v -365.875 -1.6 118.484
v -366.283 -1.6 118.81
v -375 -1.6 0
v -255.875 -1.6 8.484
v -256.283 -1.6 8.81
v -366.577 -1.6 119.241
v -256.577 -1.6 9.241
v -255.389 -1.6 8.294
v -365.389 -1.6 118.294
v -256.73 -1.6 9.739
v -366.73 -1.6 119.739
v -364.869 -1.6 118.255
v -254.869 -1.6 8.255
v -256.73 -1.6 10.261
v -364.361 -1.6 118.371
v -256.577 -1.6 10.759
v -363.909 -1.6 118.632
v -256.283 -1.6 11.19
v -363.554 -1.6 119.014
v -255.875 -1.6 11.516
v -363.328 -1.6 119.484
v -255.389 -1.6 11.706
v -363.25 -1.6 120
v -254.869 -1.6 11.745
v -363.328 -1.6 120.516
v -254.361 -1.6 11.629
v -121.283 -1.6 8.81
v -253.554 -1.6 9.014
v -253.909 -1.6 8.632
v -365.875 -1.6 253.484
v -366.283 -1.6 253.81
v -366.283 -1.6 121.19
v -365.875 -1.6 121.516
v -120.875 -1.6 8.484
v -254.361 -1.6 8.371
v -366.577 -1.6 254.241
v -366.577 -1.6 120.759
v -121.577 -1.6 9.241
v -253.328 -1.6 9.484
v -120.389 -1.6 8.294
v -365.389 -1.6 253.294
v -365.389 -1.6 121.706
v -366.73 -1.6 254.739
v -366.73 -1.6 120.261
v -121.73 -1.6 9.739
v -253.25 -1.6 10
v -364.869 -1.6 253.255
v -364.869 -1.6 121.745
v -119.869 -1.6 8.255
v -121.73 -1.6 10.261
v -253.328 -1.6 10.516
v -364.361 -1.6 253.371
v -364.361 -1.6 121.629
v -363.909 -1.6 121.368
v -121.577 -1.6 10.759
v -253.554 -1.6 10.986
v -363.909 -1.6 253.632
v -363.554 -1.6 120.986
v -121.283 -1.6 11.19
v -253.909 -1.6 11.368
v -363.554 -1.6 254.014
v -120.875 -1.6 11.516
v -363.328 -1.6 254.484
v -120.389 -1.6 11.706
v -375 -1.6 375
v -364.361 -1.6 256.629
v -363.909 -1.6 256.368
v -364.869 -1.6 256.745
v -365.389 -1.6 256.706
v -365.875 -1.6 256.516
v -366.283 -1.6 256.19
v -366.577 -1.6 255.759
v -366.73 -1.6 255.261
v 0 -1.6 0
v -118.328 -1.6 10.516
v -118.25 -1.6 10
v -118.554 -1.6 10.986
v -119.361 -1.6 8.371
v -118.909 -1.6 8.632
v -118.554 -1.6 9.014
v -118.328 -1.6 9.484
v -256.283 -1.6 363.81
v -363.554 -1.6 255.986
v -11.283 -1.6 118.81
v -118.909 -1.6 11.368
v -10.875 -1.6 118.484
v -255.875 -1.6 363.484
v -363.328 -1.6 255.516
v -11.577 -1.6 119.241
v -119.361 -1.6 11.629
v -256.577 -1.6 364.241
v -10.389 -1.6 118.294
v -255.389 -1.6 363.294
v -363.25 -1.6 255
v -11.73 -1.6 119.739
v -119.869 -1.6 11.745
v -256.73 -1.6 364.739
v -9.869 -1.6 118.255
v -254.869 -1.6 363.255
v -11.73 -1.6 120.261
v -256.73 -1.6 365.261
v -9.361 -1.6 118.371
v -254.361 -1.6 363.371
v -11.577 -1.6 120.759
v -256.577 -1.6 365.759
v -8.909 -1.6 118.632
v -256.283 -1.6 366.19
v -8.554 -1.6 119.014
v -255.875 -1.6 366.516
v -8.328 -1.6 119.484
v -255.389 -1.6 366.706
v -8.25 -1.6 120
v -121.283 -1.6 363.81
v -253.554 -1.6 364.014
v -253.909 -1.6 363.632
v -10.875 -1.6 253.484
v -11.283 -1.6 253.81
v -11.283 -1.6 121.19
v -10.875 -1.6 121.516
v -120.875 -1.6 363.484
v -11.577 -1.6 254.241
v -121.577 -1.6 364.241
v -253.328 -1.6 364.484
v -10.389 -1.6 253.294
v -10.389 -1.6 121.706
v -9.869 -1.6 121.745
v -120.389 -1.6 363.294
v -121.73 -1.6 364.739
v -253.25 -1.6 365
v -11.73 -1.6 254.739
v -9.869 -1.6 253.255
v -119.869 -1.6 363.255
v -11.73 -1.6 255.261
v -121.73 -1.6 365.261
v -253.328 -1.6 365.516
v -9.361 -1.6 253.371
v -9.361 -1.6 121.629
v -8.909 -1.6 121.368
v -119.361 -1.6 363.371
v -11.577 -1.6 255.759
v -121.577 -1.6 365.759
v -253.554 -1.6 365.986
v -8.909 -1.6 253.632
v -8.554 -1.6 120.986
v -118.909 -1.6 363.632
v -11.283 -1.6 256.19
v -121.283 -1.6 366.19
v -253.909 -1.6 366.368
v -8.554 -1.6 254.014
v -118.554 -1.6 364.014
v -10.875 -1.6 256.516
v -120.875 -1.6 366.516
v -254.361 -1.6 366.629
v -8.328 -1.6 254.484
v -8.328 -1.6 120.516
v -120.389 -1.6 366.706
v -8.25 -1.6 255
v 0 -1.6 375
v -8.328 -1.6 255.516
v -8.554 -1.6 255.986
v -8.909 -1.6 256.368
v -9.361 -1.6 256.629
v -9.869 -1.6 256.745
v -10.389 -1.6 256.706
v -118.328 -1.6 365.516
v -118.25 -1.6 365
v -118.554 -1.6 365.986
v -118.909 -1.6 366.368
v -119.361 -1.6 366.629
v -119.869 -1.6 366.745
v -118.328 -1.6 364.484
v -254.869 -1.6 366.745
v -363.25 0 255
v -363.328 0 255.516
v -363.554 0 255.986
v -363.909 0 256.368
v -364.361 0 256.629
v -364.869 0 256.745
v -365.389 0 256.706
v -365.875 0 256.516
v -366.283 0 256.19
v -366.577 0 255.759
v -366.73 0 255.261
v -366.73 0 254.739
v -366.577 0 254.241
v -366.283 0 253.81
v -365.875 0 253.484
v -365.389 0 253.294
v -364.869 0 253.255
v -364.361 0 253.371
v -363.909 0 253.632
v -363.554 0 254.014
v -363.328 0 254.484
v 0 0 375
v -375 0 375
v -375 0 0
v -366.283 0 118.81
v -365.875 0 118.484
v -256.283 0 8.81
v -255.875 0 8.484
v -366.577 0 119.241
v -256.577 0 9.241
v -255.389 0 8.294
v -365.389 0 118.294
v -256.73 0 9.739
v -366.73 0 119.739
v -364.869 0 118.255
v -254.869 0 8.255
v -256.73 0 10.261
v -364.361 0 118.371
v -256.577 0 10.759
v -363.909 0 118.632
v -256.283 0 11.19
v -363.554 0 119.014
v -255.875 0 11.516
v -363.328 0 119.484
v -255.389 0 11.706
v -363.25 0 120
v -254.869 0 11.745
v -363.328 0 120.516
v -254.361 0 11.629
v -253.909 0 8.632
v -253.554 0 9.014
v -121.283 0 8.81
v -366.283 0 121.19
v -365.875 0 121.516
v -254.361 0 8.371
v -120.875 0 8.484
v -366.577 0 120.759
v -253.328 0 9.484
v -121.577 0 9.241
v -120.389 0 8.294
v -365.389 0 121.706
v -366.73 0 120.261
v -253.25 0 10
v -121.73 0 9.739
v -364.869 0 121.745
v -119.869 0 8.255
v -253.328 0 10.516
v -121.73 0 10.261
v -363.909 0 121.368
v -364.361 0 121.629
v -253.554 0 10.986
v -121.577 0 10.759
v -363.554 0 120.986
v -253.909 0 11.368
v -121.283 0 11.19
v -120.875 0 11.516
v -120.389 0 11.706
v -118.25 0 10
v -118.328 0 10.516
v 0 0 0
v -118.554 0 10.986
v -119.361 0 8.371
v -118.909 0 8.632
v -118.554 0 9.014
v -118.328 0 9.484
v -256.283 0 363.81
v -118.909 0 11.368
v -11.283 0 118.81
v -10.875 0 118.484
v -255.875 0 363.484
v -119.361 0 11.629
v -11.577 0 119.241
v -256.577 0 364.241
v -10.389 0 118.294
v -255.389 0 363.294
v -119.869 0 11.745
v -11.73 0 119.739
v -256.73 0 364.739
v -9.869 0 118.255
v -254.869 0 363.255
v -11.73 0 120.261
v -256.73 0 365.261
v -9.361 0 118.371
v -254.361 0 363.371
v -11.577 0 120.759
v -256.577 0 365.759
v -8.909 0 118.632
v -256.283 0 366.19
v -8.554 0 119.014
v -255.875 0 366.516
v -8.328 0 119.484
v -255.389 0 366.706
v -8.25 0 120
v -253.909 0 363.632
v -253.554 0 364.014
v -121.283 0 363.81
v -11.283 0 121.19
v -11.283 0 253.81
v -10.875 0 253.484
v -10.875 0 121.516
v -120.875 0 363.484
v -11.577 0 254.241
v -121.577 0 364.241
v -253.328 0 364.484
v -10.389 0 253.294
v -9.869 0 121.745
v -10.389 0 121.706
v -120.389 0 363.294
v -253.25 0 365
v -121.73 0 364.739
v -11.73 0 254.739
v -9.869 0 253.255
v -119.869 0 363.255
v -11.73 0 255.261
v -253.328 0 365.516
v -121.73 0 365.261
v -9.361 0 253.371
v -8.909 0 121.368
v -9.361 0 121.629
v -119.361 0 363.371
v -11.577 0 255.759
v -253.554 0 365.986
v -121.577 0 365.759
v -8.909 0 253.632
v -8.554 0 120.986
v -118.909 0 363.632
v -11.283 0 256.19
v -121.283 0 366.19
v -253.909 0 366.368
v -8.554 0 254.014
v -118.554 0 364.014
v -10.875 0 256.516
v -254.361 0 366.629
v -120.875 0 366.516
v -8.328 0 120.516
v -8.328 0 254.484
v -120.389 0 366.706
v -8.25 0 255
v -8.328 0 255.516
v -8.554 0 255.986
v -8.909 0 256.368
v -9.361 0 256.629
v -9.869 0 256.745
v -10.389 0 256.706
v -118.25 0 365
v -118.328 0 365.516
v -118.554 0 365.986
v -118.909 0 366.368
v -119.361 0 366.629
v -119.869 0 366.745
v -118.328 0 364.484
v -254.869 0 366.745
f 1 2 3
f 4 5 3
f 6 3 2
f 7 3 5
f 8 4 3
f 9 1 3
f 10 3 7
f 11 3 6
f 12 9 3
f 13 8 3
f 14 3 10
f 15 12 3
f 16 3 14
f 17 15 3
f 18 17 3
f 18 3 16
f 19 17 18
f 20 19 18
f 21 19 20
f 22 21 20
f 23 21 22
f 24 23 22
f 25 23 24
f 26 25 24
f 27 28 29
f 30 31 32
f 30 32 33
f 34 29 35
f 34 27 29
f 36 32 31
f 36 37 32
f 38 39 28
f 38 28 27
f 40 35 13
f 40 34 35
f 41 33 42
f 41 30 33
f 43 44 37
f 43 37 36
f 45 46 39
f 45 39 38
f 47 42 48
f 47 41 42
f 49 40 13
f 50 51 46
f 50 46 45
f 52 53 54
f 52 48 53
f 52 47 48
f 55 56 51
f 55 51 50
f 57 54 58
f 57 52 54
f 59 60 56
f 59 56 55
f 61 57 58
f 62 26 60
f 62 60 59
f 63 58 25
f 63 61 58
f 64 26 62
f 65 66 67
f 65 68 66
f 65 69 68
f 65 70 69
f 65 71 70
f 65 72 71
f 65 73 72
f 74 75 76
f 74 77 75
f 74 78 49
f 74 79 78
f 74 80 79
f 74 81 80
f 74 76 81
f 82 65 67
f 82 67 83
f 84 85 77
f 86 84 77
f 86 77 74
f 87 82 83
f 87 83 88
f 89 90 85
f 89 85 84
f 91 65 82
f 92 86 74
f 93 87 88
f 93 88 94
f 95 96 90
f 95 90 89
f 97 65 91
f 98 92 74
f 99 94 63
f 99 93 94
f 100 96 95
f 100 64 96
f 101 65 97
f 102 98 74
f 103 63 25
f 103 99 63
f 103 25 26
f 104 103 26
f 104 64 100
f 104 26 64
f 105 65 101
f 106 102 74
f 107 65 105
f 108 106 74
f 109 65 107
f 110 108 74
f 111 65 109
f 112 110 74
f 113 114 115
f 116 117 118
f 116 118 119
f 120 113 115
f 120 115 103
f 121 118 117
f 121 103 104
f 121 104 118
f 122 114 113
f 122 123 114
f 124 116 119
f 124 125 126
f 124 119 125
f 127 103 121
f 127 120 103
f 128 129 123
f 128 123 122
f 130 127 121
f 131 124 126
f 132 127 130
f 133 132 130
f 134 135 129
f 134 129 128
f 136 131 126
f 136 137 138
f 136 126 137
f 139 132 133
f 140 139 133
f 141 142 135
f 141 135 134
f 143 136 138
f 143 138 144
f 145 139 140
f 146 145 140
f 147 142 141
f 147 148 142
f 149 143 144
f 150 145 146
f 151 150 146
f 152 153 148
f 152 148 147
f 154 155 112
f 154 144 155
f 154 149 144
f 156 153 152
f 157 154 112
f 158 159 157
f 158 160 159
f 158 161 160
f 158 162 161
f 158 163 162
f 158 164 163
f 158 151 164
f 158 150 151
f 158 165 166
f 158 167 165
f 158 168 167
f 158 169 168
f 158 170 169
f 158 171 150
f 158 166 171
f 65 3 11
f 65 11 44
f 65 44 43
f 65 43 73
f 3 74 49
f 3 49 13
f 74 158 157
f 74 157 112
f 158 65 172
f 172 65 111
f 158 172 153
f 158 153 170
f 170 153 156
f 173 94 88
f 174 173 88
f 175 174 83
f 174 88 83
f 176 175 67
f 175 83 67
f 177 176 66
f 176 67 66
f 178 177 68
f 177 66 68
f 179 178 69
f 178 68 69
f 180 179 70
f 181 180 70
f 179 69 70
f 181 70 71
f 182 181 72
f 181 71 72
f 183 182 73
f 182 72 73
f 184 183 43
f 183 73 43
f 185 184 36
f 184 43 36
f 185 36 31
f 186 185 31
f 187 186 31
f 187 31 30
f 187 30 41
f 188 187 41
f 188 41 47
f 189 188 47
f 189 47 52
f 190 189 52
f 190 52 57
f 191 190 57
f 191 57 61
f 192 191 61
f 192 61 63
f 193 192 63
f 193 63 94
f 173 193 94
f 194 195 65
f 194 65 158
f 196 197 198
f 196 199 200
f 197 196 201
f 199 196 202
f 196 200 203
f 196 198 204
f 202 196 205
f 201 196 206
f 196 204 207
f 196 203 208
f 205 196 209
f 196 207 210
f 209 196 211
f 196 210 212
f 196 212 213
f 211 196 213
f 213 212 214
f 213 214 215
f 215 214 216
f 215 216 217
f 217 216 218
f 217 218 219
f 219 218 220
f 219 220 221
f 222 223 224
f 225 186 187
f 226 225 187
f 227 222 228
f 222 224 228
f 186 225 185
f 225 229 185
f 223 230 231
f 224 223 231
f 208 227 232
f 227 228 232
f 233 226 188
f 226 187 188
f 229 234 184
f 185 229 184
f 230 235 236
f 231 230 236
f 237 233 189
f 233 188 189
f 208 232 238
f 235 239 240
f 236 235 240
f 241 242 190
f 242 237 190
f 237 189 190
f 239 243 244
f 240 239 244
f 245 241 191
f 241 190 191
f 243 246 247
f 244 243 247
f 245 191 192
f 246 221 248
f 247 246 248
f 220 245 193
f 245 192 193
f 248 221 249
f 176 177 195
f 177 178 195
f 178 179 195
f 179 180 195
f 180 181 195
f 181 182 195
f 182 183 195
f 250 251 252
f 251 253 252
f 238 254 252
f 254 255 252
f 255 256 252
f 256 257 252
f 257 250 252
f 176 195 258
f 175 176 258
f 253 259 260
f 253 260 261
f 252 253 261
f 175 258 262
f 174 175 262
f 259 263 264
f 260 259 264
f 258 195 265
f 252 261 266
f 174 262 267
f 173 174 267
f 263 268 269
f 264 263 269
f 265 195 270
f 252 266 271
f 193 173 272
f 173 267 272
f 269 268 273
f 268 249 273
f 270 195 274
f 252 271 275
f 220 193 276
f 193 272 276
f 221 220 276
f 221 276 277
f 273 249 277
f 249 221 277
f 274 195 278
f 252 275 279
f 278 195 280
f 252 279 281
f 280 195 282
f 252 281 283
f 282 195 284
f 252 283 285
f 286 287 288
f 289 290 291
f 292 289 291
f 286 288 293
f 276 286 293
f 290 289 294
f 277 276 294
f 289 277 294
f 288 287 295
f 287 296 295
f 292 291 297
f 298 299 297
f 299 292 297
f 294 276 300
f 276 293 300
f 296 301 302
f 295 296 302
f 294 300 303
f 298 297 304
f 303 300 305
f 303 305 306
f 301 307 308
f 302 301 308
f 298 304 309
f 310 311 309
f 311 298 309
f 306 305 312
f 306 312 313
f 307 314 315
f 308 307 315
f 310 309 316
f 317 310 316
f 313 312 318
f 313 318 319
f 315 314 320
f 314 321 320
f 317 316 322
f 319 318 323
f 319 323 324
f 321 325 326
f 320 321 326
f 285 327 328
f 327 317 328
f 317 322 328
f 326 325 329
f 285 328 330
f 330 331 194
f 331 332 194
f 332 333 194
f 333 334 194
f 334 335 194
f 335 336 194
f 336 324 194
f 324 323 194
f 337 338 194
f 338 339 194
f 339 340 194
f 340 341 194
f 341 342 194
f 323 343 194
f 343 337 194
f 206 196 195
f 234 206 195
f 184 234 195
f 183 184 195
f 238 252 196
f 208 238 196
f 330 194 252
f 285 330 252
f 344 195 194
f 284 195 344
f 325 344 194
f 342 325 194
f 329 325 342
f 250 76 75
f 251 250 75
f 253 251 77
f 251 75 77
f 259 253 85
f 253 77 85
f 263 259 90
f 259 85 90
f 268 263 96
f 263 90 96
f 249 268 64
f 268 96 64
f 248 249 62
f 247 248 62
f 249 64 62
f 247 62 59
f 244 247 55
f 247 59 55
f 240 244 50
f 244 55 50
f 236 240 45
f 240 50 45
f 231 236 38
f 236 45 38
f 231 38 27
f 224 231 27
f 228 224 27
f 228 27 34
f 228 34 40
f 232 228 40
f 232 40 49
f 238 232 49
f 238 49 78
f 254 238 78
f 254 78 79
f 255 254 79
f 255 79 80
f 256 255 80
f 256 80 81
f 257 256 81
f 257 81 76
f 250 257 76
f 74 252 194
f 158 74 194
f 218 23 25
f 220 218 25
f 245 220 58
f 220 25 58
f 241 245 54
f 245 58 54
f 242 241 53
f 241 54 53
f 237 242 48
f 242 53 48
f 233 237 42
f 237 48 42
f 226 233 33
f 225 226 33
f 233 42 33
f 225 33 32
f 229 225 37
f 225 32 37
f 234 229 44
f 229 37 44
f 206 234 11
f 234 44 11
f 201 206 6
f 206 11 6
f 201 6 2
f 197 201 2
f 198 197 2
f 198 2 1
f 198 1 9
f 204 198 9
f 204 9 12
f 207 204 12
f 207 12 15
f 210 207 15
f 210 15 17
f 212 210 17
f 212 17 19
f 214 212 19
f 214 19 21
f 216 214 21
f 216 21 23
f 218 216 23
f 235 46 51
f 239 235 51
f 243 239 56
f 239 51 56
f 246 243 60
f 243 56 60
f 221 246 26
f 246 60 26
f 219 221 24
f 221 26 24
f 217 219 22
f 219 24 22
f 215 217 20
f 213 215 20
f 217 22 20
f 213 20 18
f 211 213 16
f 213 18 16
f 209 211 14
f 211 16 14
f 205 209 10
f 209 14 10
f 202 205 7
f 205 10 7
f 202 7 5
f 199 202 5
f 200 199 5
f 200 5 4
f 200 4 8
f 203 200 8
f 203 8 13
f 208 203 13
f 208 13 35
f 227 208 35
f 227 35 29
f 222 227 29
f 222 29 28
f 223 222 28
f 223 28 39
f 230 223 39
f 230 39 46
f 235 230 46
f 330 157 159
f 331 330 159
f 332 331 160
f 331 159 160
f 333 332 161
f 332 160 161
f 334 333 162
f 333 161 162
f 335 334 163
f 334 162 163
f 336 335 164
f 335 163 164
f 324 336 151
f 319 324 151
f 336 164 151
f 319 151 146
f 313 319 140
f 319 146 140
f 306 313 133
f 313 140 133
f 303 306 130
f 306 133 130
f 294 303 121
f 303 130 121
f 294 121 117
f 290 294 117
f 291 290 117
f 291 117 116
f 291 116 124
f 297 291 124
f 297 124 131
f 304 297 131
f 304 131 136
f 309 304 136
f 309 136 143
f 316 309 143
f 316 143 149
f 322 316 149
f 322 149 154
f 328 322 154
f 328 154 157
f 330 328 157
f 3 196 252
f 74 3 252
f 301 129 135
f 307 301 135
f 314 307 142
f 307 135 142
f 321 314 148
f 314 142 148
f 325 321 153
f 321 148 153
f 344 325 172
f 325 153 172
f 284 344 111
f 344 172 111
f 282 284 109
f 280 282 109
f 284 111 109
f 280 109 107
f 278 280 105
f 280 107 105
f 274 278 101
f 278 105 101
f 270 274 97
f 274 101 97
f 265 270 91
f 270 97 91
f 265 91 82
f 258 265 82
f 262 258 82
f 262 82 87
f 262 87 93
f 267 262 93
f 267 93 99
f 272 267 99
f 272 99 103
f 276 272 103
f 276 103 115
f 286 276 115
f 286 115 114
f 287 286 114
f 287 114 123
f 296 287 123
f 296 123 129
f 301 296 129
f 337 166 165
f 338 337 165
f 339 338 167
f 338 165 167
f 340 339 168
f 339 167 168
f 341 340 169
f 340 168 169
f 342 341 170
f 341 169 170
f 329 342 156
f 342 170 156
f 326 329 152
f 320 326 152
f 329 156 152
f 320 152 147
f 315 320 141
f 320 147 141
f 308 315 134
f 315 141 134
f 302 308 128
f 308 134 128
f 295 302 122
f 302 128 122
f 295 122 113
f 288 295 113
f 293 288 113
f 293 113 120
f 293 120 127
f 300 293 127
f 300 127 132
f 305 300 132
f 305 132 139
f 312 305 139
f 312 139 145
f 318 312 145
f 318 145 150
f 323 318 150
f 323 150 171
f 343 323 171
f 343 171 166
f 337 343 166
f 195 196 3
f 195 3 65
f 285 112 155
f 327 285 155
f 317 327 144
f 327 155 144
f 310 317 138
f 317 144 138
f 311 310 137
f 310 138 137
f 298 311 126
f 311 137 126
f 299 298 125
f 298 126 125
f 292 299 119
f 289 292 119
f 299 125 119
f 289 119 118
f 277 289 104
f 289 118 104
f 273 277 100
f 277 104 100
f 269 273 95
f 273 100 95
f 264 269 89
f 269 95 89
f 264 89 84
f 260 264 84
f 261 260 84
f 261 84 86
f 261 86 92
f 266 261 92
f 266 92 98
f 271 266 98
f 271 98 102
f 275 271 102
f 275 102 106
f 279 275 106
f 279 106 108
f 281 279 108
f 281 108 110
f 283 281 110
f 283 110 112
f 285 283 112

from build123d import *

# Parameters (mm, degrees)
F0_W     = 375
F0_H     = 375
F1_DEPTH = 1.6
F2_R     = 1.75
F3_DEPTH = 2


with BuildPart() as f1:
    # F0 (on Front) → F1 (new body)
    with BuildSketch(Plane.XZ):
        with Locations((-187.5, 187.5)):
            Rectangle(F0_W, F0_H)
    extrude(amount=F1_DEPTH)

    # F2 (on face) → F3 (cut)
    with BuildSketch(Plane.XZ.offset(1.6)):
        with Locations((-255, 365)):
            Circle(F2_R)
        with Locations((-120, 365)):
            Circle(F2_R)
        with Locations((-10, 120)):
            Circle(F2_R)
        with Locations((-365, 120)):
            Circle(F2_R)
        with Locations((-365, 255)):
            Circle(F2_R)
        with Locations((-10, 255)):
            Circle(F2_R)
        with Locations((-120, 10)):
            Circle(F2_R)
        with Locations((-255, 10)):
            Circle(F2_R)
    extrude(amount=-F3_DEPTH, mode=Mode.SUBTRACT)


solid = f1.part
